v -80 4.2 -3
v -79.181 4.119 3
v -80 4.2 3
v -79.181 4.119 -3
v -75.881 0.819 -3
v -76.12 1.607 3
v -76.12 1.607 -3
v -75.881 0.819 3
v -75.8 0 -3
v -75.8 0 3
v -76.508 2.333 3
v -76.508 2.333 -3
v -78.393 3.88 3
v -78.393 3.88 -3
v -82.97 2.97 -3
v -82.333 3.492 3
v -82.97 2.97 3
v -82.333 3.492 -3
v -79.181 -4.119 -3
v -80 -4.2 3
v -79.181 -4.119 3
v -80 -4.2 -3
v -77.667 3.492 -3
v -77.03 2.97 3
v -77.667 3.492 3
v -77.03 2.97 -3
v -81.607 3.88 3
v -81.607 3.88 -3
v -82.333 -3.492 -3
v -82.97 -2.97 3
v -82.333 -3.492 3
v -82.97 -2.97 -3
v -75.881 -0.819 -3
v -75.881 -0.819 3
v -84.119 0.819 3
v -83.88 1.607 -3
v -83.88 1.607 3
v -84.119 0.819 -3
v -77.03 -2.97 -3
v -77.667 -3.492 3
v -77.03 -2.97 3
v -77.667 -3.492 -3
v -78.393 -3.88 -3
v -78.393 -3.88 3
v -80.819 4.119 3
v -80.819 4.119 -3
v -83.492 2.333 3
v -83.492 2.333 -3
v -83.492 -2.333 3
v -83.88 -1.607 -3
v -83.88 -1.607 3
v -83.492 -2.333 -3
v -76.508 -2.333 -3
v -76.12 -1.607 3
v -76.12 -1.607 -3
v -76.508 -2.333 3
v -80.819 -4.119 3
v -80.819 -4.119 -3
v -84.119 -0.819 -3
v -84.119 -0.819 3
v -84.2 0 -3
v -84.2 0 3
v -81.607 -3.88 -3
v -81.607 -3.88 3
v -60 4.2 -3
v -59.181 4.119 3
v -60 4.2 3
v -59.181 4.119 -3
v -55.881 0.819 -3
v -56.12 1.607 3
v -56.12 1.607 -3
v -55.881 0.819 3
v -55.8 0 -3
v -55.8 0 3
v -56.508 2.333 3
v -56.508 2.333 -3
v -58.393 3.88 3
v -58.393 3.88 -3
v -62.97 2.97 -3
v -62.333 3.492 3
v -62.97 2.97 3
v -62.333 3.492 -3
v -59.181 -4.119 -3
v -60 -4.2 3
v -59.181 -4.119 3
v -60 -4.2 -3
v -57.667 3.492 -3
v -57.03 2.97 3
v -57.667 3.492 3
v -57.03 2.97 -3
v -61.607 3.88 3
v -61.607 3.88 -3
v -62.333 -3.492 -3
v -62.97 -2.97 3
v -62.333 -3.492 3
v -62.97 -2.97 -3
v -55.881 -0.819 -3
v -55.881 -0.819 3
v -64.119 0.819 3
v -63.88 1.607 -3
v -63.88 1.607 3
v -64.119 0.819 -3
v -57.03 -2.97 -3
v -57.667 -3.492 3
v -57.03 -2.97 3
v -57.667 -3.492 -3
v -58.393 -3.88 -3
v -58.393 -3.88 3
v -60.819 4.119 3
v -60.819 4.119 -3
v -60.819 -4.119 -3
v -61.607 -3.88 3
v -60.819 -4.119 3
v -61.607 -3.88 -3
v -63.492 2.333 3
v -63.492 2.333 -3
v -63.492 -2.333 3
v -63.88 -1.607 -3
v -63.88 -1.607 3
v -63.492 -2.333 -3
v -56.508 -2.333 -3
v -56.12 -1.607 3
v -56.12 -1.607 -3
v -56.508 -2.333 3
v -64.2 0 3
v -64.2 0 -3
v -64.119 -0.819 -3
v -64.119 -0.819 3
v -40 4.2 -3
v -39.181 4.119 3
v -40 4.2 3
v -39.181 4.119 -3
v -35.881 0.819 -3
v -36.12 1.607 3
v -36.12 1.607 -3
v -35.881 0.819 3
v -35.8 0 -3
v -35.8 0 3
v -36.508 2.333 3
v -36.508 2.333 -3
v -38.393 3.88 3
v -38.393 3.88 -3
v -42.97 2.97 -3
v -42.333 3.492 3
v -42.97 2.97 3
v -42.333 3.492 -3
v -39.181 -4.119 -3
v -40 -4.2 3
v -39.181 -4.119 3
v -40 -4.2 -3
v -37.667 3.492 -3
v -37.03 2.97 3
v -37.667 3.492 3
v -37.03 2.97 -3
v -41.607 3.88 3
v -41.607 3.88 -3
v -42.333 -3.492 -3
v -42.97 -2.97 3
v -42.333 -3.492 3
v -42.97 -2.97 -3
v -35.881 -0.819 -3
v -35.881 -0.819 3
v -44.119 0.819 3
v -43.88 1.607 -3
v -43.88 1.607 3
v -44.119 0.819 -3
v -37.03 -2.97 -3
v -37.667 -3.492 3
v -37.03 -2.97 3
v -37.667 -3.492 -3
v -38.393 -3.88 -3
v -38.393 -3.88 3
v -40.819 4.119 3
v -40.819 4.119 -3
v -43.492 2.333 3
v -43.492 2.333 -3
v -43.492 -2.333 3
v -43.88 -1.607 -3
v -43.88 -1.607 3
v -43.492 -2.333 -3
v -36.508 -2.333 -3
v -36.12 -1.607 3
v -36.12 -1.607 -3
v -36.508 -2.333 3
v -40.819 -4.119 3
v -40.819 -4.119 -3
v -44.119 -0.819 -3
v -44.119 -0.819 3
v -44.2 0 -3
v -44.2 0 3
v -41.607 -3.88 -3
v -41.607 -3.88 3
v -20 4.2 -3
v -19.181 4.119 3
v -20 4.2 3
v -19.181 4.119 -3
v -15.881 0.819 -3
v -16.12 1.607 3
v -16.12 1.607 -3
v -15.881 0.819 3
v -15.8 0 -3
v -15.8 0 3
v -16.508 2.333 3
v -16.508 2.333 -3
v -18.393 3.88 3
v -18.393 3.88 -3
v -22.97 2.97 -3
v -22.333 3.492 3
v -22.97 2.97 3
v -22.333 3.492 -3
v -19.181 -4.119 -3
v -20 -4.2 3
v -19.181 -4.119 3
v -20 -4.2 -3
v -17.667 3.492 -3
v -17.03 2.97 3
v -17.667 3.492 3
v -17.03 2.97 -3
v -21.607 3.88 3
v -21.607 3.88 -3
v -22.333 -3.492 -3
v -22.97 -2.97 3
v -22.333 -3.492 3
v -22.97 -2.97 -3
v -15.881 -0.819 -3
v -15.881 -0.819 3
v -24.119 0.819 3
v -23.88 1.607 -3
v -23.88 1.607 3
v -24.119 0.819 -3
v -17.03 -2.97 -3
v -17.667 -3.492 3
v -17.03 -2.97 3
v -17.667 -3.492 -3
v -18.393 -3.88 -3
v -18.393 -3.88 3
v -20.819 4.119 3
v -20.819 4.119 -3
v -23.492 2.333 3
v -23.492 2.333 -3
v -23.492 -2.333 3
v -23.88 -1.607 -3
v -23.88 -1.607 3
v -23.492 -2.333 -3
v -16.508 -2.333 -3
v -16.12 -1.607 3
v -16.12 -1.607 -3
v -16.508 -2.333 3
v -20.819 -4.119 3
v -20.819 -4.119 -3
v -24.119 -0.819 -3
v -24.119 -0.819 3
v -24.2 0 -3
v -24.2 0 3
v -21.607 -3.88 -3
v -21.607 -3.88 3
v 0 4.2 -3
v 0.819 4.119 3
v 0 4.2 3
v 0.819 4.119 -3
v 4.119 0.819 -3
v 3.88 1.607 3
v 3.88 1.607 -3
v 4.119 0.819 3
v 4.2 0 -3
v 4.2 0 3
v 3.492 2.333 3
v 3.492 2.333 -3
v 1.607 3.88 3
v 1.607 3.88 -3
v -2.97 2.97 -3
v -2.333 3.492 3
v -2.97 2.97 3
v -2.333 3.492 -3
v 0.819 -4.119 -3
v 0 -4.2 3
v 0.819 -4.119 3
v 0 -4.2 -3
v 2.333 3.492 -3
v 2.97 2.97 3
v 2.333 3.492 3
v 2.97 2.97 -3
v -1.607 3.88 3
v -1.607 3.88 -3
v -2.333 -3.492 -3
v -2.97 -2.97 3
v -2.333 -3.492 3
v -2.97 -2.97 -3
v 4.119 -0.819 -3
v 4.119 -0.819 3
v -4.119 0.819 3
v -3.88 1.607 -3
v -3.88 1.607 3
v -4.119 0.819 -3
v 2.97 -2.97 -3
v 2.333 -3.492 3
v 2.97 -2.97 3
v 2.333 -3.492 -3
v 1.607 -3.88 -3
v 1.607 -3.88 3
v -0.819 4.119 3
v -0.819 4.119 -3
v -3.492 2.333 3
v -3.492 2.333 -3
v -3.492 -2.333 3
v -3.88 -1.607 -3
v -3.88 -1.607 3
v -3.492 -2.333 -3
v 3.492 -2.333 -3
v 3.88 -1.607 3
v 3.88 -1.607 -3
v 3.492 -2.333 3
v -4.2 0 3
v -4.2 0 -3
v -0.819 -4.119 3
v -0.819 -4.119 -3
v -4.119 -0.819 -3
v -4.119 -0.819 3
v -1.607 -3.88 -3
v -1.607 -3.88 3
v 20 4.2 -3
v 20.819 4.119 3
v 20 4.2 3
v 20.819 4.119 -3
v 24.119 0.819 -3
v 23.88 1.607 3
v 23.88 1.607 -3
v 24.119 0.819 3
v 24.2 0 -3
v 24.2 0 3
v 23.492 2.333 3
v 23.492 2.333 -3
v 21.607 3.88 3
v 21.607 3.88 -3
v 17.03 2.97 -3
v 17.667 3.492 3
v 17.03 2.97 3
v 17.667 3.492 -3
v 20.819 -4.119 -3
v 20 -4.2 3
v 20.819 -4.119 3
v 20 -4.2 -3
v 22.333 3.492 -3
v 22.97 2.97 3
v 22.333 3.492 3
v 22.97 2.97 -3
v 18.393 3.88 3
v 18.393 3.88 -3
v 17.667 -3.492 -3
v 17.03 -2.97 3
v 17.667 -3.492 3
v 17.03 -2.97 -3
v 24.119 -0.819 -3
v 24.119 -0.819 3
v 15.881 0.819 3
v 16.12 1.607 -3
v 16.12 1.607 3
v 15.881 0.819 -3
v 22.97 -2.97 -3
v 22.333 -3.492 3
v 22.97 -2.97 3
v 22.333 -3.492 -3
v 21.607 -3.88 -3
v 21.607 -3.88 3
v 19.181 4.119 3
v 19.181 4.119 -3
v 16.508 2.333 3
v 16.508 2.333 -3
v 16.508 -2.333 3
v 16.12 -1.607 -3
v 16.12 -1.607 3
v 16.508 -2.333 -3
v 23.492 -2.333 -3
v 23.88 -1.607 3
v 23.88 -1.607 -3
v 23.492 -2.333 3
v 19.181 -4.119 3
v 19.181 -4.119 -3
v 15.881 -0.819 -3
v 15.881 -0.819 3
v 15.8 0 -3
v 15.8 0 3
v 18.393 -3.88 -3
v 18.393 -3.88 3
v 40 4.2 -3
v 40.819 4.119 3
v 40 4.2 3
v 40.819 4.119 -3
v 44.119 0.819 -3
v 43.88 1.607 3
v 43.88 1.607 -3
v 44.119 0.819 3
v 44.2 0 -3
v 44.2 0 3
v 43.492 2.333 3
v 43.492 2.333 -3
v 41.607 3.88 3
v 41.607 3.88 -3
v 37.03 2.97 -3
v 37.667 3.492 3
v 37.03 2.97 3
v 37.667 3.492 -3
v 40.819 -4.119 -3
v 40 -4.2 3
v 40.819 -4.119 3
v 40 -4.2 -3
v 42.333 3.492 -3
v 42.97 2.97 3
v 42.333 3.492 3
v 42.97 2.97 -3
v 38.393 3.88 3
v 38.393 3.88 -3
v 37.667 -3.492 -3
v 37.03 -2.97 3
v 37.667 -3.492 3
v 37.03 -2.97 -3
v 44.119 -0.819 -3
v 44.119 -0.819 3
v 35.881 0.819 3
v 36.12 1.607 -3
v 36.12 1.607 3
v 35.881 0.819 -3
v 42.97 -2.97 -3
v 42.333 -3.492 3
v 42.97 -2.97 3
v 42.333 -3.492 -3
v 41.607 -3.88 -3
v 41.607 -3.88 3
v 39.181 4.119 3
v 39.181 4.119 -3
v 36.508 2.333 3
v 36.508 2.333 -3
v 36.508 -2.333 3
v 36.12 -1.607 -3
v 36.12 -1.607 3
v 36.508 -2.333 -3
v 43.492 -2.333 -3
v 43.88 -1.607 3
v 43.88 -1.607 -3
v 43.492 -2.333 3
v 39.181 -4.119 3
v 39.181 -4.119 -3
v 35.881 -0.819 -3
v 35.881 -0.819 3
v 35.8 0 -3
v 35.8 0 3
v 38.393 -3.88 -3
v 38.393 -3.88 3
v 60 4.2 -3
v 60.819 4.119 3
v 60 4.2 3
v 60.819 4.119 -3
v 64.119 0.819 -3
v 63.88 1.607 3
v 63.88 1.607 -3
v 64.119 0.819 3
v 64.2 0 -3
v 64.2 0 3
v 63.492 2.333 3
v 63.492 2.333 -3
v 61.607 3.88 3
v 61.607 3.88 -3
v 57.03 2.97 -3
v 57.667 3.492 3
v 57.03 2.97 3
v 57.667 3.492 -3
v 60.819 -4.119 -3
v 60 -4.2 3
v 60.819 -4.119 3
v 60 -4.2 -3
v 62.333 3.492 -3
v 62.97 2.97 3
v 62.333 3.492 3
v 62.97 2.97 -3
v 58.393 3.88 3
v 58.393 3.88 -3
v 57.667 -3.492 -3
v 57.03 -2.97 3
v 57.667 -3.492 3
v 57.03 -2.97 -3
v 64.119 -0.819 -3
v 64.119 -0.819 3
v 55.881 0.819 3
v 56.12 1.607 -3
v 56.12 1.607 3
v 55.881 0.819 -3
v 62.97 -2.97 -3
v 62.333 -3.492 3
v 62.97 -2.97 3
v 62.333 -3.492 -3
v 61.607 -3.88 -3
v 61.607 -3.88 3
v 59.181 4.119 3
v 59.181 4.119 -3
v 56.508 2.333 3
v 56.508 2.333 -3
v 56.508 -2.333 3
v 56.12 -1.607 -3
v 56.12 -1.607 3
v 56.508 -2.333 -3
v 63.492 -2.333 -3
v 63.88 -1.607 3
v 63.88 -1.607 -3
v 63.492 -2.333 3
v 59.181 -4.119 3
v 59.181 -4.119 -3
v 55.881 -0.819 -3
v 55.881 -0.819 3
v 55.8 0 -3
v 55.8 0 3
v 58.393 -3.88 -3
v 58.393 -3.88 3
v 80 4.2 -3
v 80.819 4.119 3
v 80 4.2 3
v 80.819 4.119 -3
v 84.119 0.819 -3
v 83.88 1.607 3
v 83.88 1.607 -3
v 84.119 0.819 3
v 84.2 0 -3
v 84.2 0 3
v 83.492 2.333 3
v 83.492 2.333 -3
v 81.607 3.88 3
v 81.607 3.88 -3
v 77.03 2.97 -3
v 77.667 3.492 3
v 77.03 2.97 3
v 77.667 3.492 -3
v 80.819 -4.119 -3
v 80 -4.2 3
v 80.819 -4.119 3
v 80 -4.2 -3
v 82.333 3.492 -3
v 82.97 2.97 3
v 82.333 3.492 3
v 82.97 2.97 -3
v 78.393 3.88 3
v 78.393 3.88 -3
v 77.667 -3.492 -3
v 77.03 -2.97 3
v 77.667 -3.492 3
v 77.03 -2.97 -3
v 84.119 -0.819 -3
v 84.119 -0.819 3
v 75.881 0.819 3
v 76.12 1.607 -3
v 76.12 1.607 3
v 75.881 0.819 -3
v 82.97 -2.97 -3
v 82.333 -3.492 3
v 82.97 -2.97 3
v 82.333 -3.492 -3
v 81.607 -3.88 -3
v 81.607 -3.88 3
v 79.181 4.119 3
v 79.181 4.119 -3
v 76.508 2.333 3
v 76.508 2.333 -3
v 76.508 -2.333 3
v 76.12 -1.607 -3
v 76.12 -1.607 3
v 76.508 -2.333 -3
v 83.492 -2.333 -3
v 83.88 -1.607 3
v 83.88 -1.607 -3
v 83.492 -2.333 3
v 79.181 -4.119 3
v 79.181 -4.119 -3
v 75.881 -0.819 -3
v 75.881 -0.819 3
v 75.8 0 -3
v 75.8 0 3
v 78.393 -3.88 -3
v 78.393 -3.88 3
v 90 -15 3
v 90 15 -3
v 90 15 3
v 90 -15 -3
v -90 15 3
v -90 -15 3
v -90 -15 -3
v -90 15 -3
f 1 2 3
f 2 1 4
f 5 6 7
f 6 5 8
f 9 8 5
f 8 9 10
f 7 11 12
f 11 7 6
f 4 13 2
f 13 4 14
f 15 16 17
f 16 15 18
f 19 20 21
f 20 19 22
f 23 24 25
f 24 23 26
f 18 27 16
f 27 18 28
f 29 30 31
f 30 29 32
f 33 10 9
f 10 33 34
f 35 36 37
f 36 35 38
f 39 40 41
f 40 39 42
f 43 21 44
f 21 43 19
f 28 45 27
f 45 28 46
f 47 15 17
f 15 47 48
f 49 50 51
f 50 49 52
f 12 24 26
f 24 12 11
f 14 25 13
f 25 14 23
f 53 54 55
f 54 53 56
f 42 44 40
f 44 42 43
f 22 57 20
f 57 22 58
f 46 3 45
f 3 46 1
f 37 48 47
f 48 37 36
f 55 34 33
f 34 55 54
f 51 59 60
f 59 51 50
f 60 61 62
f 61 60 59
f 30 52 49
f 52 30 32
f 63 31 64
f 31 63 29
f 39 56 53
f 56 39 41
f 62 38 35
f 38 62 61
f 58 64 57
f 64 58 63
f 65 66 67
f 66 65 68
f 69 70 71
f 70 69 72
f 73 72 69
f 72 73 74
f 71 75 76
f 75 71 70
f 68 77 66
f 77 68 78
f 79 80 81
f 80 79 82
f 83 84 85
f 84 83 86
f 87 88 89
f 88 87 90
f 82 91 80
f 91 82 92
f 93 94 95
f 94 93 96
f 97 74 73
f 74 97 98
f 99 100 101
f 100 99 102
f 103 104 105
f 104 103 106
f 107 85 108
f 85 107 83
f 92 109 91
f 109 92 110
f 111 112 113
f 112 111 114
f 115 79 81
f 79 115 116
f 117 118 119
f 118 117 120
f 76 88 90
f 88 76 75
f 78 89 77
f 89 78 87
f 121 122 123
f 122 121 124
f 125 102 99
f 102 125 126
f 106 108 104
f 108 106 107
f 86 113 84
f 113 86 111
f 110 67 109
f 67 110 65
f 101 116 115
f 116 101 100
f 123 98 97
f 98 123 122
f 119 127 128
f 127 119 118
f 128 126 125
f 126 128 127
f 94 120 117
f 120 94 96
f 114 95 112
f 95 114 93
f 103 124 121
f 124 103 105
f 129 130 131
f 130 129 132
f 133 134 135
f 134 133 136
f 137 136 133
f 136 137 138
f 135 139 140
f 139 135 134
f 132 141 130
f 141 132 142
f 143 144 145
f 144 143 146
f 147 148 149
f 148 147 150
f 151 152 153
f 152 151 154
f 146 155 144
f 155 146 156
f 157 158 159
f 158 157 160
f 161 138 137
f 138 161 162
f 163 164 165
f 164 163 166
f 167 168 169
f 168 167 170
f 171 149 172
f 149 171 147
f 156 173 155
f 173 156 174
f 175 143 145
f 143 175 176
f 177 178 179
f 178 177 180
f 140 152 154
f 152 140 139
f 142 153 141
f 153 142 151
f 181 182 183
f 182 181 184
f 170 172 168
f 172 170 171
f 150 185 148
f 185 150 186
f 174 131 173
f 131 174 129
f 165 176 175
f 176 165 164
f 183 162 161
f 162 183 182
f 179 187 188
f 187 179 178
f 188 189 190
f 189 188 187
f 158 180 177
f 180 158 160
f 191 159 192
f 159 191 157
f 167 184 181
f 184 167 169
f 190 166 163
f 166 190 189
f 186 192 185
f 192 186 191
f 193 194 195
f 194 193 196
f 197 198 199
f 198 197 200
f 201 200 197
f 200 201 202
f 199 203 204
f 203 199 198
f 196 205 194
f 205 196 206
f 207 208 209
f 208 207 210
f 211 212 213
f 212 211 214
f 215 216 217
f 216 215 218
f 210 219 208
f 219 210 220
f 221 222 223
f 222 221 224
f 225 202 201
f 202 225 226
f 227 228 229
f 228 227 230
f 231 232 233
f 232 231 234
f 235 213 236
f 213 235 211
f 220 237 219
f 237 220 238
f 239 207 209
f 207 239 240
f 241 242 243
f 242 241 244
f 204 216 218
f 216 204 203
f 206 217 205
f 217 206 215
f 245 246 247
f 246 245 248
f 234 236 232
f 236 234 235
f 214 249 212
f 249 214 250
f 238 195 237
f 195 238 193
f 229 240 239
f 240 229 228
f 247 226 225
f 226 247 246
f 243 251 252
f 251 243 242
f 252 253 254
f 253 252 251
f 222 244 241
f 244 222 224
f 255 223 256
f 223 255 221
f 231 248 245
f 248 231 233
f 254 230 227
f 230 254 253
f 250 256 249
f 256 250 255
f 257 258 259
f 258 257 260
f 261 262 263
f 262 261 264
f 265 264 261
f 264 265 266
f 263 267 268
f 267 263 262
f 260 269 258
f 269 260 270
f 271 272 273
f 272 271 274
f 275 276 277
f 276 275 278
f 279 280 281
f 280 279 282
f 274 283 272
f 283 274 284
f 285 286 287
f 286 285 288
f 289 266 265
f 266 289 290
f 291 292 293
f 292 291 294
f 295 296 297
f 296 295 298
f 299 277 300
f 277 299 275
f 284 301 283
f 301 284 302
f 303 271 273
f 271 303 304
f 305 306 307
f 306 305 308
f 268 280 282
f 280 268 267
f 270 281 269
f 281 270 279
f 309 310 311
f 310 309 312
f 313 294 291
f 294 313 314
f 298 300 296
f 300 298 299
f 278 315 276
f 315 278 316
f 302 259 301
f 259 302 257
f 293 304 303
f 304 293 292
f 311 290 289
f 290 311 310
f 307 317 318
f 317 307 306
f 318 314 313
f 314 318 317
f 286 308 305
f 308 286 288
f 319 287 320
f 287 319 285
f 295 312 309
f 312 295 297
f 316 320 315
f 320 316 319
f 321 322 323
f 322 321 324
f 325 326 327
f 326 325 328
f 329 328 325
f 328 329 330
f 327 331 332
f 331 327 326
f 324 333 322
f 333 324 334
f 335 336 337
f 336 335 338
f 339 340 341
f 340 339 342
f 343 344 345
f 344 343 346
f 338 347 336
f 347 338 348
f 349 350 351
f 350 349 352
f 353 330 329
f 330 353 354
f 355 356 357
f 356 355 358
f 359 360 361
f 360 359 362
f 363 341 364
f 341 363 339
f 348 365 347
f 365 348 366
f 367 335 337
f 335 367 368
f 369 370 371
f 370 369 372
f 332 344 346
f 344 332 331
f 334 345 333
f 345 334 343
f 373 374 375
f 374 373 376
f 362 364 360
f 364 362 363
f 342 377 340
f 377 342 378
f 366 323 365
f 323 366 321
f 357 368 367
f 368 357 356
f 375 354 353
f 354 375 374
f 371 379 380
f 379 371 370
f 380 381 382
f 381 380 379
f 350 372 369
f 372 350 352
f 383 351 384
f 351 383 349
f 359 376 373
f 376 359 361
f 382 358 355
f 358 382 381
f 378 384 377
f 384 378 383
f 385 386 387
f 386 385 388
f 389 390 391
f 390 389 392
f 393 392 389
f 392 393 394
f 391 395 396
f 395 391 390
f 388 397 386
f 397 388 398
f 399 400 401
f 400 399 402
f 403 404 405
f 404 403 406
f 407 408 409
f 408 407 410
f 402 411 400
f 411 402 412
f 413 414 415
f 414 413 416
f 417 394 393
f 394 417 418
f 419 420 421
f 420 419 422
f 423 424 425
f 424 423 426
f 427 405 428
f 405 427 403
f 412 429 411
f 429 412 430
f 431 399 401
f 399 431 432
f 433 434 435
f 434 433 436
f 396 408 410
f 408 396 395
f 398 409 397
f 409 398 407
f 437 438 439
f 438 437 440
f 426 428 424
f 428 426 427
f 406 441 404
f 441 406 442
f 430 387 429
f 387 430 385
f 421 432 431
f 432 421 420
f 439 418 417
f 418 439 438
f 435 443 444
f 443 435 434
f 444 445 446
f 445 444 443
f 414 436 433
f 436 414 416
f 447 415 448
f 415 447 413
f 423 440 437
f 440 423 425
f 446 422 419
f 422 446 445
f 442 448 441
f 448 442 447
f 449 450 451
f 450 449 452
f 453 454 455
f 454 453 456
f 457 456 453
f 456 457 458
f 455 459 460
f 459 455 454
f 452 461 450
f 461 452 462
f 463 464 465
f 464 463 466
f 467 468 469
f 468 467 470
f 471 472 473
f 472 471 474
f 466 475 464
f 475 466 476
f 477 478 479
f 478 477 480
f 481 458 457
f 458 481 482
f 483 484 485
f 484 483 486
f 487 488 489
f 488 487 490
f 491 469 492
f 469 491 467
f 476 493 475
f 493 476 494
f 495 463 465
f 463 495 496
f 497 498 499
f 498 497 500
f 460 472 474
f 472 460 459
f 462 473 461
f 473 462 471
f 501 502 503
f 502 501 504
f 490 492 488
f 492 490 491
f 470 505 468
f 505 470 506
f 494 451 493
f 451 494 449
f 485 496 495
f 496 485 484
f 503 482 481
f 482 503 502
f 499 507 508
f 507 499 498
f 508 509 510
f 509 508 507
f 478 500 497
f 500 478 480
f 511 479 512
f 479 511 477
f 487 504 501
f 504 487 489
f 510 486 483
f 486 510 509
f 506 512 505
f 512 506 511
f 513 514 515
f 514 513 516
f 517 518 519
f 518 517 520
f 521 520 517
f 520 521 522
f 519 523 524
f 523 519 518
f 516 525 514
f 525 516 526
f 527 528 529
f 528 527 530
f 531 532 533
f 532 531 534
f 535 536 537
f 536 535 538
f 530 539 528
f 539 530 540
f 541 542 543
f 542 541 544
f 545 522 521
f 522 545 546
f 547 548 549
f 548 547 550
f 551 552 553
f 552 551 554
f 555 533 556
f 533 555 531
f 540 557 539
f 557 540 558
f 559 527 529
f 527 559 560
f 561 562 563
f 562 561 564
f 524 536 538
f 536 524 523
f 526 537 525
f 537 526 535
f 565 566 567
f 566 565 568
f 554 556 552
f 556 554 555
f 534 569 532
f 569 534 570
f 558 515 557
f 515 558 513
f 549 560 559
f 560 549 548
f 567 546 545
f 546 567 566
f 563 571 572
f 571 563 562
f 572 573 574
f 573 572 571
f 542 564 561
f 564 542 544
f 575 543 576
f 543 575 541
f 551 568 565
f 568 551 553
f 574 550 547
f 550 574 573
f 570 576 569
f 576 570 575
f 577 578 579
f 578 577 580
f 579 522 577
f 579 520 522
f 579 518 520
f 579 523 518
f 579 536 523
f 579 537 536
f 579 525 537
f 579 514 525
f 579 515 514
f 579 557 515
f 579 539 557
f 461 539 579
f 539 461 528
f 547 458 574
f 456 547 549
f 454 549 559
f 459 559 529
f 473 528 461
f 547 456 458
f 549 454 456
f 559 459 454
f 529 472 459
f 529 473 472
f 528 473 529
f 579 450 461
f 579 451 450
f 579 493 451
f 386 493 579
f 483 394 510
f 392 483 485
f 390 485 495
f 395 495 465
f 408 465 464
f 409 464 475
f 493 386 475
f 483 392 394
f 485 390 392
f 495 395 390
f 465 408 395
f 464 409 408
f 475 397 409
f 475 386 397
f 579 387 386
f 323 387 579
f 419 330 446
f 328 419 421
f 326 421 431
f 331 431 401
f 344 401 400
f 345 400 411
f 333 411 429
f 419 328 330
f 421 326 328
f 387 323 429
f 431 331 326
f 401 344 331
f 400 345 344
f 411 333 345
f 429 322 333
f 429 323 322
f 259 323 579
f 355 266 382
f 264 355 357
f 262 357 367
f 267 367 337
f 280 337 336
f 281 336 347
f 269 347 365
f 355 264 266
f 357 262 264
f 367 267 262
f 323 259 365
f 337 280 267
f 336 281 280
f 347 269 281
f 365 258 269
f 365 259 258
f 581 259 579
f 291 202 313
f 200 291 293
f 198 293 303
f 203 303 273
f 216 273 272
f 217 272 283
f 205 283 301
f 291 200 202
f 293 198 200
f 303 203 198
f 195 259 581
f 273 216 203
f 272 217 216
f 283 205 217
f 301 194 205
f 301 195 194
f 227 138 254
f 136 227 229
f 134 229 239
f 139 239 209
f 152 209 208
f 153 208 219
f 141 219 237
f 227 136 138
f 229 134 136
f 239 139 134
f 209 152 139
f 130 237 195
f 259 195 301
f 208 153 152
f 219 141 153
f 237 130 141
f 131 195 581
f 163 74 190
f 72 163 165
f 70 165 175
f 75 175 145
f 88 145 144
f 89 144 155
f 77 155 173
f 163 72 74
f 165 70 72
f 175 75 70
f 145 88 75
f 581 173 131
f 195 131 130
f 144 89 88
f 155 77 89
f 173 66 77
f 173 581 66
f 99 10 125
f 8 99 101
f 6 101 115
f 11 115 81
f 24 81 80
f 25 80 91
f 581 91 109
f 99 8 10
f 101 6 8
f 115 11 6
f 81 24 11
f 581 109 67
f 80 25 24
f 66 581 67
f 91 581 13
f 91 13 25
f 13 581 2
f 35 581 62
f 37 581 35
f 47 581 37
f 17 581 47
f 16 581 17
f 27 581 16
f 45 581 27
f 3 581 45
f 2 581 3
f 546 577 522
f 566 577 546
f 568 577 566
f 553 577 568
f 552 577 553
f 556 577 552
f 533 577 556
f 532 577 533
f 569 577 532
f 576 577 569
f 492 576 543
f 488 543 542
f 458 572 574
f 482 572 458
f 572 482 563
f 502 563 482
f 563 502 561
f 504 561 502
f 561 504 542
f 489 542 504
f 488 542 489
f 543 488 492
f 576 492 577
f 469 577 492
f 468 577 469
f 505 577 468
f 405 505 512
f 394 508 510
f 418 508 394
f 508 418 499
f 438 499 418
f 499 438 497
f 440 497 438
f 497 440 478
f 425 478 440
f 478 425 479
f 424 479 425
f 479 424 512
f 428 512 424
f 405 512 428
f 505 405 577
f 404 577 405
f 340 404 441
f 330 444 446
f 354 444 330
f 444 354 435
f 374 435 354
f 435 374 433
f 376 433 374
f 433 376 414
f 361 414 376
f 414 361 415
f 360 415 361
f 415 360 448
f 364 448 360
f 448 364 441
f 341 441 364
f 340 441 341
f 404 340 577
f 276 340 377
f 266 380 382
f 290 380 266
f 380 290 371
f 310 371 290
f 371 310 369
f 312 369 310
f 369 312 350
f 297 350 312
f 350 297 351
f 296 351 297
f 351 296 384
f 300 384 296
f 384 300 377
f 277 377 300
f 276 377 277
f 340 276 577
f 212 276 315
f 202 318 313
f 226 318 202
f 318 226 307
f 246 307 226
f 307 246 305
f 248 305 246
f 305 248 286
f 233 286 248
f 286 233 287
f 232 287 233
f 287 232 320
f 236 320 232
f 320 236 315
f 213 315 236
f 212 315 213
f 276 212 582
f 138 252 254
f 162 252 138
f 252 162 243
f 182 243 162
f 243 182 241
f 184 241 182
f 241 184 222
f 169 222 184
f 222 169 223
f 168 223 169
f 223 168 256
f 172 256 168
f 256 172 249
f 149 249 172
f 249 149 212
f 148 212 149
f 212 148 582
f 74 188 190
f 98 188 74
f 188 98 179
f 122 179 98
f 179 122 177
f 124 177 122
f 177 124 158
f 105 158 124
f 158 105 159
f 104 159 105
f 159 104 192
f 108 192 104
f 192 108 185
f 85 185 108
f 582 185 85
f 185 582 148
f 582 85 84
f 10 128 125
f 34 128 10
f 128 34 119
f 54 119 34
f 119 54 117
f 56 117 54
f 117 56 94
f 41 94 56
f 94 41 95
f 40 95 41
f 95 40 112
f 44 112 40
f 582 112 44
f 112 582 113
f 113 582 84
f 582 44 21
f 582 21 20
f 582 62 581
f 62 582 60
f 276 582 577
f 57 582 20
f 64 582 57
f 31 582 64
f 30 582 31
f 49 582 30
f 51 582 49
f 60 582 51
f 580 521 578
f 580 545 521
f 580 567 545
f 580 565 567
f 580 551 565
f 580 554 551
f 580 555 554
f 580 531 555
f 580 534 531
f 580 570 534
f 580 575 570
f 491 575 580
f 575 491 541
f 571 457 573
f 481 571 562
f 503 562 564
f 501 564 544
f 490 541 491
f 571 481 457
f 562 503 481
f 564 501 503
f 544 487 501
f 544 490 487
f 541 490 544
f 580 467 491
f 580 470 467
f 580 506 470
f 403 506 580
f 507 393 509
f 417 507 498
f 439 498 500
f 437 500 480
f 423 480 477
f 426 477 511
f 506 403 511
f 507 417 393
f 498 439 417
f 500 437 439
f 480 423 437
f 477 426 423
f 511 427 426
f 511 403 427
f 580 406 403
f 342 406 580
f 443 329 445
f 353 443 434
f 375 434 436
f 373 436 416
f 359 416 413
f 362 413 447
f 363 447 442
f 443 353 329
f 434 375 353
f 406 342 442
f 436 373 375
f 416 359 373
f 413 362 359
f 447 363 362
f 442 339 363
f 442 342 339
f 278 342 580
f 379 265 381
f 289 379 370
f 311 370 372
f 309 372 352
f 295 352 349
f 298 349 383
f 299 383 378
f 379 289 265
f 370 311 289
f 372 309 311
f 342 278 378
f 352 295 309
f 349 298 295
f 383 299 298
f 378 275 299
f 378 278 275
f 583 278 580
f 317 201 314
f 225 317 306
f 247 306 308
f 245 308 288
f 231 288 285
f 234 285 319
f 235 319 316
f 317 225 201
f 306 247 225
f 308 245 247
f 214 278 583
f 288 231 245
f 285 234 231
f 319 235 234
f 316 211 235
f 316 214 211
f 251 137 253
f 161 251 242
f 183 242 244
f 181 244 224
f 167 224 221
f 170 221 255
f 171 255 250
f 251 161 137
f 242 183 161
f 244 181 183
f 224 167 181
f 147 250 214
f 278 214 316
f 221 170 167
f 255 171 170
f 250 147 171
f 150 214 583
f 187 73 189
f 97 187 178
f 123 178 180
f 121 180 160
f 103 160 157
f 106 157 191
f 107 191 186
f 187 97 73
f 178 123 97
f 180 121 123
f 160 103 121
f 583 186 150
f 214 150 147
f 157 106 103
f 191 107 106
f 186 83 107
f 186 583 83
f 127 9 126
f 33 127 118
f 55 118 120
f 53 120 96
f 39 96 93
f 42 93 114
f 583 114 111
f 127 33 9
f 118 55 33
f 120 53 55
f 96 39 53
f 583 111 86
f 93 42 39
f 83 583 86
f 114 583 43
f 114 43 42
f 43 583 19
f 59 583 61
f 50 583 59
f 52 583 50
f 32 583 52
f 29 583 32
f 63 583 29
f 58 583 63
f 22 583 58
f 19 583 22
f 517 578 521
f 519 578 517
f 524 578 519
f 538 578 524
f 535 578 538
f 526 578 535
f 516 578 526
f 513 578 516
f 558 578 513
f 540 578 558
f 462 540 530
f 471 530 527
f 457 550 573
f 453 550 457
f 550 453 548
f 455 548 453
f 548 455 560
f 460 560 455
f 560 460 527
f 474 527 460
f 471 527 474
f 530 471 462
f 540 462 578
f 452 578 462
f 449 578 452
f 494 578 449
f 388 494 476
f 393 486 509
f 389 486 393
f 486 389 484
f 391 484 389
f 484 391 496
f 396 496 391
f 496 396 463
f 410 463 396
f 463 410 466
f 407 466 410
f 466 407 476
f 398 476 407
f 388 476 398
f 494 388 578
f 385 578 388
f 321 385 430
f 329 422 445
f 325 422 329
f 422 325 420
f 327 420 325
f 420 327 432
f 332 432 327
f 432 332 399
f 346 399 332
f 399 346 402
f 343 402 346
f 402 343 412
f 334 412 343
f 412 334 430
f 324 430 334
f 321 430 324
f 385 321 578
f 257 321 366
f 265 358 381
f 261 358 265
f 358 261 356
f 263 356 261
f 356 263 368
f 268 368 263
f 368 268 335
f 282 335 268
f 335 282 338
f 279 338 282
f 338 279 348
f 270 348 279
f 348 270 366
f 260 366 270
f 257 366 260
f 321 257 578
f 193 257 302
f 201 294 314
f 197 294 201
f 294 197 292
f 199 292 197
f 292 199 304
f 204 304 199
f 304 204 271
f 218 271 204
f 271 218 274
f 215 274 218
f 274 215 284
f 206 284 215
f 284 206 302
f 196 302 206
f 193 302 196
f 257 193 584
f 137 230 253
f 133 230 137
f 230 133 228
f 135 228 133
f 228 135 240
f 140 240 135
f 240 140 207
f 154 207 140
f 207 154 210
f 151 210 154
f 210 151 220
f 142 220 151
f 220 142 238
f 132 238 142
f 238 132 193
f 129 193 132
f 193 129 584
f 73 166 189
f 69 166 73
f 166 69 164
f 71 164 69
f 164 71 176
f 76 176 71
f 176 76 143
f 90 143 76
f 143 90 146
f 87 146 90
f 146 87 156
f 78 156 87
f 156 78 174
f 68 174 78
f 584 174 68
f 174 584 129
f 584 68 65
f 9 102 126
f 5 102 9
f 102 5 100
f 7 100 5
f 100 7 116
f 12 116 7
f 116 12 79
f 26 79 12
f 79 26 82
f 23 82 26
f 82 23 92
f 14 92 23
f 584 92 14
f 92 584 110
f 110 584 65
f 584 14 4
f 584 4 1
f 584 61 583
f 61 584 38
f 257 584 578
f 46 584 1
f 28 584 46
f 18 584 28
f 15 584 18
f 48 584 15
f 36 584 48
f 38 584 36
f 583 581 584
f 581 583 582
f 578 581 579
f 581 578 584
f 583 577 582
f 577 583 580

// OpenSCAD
$fn = 32;

// ----------------------------------------------------------------------
// Hole bar, 9 x Ø8.4
// row layout, 10 mm edge offset
// ----------------------------------------------------------------------

// --- parameters (mm) ---
bar_w = 30;    // bar width (Y)
bar_t = 6;     // bar thickness (Z)
holes = 9;     // holes per row
hole_d = 8.4;  // hole diameter
edge = 10;     // offset from the bar end to the first hole
pitch = 20;    // pitch between neighbouring holes

// --- derived feature positions (mm) ---
span = (holes - 1) * pitch;   // = 160   distance between the end holes
bar_l = span + 2 * edge;      // = 180   overall bar length
start_x = -bar_l / 2 + edge;  // = -80   X of the first hole
feature_centers = [
  [start_x + 0 * pitch, 0],
  [start_x + 1 * pitch, 0],
  [start_x + 2 * pitch, 0],
  [start_x + 3 * pitch, 0],
  [start_x + 4 * pitch, 0],
  [start_x + 5 * pitch, 0],
  [start_x + 6 * pitch, 0],
  [start_x + 7 * pitch, 0],
  [start_x + 8 * pitch, 0]
];   // hole centres of the first row

// bar with one row of holes, drilled from feature_centers
difference() {
  translate([-bar_l / 2, -bar_w / 2, -bar_t / 2]) cube([bar_l, bar_w, bar_t]);
  for (centre = feature_centers)
    translate([centre[0], centre[1], 0])
      cylinder(d = hole_d, h = bar_t + 2, center = true);
}
